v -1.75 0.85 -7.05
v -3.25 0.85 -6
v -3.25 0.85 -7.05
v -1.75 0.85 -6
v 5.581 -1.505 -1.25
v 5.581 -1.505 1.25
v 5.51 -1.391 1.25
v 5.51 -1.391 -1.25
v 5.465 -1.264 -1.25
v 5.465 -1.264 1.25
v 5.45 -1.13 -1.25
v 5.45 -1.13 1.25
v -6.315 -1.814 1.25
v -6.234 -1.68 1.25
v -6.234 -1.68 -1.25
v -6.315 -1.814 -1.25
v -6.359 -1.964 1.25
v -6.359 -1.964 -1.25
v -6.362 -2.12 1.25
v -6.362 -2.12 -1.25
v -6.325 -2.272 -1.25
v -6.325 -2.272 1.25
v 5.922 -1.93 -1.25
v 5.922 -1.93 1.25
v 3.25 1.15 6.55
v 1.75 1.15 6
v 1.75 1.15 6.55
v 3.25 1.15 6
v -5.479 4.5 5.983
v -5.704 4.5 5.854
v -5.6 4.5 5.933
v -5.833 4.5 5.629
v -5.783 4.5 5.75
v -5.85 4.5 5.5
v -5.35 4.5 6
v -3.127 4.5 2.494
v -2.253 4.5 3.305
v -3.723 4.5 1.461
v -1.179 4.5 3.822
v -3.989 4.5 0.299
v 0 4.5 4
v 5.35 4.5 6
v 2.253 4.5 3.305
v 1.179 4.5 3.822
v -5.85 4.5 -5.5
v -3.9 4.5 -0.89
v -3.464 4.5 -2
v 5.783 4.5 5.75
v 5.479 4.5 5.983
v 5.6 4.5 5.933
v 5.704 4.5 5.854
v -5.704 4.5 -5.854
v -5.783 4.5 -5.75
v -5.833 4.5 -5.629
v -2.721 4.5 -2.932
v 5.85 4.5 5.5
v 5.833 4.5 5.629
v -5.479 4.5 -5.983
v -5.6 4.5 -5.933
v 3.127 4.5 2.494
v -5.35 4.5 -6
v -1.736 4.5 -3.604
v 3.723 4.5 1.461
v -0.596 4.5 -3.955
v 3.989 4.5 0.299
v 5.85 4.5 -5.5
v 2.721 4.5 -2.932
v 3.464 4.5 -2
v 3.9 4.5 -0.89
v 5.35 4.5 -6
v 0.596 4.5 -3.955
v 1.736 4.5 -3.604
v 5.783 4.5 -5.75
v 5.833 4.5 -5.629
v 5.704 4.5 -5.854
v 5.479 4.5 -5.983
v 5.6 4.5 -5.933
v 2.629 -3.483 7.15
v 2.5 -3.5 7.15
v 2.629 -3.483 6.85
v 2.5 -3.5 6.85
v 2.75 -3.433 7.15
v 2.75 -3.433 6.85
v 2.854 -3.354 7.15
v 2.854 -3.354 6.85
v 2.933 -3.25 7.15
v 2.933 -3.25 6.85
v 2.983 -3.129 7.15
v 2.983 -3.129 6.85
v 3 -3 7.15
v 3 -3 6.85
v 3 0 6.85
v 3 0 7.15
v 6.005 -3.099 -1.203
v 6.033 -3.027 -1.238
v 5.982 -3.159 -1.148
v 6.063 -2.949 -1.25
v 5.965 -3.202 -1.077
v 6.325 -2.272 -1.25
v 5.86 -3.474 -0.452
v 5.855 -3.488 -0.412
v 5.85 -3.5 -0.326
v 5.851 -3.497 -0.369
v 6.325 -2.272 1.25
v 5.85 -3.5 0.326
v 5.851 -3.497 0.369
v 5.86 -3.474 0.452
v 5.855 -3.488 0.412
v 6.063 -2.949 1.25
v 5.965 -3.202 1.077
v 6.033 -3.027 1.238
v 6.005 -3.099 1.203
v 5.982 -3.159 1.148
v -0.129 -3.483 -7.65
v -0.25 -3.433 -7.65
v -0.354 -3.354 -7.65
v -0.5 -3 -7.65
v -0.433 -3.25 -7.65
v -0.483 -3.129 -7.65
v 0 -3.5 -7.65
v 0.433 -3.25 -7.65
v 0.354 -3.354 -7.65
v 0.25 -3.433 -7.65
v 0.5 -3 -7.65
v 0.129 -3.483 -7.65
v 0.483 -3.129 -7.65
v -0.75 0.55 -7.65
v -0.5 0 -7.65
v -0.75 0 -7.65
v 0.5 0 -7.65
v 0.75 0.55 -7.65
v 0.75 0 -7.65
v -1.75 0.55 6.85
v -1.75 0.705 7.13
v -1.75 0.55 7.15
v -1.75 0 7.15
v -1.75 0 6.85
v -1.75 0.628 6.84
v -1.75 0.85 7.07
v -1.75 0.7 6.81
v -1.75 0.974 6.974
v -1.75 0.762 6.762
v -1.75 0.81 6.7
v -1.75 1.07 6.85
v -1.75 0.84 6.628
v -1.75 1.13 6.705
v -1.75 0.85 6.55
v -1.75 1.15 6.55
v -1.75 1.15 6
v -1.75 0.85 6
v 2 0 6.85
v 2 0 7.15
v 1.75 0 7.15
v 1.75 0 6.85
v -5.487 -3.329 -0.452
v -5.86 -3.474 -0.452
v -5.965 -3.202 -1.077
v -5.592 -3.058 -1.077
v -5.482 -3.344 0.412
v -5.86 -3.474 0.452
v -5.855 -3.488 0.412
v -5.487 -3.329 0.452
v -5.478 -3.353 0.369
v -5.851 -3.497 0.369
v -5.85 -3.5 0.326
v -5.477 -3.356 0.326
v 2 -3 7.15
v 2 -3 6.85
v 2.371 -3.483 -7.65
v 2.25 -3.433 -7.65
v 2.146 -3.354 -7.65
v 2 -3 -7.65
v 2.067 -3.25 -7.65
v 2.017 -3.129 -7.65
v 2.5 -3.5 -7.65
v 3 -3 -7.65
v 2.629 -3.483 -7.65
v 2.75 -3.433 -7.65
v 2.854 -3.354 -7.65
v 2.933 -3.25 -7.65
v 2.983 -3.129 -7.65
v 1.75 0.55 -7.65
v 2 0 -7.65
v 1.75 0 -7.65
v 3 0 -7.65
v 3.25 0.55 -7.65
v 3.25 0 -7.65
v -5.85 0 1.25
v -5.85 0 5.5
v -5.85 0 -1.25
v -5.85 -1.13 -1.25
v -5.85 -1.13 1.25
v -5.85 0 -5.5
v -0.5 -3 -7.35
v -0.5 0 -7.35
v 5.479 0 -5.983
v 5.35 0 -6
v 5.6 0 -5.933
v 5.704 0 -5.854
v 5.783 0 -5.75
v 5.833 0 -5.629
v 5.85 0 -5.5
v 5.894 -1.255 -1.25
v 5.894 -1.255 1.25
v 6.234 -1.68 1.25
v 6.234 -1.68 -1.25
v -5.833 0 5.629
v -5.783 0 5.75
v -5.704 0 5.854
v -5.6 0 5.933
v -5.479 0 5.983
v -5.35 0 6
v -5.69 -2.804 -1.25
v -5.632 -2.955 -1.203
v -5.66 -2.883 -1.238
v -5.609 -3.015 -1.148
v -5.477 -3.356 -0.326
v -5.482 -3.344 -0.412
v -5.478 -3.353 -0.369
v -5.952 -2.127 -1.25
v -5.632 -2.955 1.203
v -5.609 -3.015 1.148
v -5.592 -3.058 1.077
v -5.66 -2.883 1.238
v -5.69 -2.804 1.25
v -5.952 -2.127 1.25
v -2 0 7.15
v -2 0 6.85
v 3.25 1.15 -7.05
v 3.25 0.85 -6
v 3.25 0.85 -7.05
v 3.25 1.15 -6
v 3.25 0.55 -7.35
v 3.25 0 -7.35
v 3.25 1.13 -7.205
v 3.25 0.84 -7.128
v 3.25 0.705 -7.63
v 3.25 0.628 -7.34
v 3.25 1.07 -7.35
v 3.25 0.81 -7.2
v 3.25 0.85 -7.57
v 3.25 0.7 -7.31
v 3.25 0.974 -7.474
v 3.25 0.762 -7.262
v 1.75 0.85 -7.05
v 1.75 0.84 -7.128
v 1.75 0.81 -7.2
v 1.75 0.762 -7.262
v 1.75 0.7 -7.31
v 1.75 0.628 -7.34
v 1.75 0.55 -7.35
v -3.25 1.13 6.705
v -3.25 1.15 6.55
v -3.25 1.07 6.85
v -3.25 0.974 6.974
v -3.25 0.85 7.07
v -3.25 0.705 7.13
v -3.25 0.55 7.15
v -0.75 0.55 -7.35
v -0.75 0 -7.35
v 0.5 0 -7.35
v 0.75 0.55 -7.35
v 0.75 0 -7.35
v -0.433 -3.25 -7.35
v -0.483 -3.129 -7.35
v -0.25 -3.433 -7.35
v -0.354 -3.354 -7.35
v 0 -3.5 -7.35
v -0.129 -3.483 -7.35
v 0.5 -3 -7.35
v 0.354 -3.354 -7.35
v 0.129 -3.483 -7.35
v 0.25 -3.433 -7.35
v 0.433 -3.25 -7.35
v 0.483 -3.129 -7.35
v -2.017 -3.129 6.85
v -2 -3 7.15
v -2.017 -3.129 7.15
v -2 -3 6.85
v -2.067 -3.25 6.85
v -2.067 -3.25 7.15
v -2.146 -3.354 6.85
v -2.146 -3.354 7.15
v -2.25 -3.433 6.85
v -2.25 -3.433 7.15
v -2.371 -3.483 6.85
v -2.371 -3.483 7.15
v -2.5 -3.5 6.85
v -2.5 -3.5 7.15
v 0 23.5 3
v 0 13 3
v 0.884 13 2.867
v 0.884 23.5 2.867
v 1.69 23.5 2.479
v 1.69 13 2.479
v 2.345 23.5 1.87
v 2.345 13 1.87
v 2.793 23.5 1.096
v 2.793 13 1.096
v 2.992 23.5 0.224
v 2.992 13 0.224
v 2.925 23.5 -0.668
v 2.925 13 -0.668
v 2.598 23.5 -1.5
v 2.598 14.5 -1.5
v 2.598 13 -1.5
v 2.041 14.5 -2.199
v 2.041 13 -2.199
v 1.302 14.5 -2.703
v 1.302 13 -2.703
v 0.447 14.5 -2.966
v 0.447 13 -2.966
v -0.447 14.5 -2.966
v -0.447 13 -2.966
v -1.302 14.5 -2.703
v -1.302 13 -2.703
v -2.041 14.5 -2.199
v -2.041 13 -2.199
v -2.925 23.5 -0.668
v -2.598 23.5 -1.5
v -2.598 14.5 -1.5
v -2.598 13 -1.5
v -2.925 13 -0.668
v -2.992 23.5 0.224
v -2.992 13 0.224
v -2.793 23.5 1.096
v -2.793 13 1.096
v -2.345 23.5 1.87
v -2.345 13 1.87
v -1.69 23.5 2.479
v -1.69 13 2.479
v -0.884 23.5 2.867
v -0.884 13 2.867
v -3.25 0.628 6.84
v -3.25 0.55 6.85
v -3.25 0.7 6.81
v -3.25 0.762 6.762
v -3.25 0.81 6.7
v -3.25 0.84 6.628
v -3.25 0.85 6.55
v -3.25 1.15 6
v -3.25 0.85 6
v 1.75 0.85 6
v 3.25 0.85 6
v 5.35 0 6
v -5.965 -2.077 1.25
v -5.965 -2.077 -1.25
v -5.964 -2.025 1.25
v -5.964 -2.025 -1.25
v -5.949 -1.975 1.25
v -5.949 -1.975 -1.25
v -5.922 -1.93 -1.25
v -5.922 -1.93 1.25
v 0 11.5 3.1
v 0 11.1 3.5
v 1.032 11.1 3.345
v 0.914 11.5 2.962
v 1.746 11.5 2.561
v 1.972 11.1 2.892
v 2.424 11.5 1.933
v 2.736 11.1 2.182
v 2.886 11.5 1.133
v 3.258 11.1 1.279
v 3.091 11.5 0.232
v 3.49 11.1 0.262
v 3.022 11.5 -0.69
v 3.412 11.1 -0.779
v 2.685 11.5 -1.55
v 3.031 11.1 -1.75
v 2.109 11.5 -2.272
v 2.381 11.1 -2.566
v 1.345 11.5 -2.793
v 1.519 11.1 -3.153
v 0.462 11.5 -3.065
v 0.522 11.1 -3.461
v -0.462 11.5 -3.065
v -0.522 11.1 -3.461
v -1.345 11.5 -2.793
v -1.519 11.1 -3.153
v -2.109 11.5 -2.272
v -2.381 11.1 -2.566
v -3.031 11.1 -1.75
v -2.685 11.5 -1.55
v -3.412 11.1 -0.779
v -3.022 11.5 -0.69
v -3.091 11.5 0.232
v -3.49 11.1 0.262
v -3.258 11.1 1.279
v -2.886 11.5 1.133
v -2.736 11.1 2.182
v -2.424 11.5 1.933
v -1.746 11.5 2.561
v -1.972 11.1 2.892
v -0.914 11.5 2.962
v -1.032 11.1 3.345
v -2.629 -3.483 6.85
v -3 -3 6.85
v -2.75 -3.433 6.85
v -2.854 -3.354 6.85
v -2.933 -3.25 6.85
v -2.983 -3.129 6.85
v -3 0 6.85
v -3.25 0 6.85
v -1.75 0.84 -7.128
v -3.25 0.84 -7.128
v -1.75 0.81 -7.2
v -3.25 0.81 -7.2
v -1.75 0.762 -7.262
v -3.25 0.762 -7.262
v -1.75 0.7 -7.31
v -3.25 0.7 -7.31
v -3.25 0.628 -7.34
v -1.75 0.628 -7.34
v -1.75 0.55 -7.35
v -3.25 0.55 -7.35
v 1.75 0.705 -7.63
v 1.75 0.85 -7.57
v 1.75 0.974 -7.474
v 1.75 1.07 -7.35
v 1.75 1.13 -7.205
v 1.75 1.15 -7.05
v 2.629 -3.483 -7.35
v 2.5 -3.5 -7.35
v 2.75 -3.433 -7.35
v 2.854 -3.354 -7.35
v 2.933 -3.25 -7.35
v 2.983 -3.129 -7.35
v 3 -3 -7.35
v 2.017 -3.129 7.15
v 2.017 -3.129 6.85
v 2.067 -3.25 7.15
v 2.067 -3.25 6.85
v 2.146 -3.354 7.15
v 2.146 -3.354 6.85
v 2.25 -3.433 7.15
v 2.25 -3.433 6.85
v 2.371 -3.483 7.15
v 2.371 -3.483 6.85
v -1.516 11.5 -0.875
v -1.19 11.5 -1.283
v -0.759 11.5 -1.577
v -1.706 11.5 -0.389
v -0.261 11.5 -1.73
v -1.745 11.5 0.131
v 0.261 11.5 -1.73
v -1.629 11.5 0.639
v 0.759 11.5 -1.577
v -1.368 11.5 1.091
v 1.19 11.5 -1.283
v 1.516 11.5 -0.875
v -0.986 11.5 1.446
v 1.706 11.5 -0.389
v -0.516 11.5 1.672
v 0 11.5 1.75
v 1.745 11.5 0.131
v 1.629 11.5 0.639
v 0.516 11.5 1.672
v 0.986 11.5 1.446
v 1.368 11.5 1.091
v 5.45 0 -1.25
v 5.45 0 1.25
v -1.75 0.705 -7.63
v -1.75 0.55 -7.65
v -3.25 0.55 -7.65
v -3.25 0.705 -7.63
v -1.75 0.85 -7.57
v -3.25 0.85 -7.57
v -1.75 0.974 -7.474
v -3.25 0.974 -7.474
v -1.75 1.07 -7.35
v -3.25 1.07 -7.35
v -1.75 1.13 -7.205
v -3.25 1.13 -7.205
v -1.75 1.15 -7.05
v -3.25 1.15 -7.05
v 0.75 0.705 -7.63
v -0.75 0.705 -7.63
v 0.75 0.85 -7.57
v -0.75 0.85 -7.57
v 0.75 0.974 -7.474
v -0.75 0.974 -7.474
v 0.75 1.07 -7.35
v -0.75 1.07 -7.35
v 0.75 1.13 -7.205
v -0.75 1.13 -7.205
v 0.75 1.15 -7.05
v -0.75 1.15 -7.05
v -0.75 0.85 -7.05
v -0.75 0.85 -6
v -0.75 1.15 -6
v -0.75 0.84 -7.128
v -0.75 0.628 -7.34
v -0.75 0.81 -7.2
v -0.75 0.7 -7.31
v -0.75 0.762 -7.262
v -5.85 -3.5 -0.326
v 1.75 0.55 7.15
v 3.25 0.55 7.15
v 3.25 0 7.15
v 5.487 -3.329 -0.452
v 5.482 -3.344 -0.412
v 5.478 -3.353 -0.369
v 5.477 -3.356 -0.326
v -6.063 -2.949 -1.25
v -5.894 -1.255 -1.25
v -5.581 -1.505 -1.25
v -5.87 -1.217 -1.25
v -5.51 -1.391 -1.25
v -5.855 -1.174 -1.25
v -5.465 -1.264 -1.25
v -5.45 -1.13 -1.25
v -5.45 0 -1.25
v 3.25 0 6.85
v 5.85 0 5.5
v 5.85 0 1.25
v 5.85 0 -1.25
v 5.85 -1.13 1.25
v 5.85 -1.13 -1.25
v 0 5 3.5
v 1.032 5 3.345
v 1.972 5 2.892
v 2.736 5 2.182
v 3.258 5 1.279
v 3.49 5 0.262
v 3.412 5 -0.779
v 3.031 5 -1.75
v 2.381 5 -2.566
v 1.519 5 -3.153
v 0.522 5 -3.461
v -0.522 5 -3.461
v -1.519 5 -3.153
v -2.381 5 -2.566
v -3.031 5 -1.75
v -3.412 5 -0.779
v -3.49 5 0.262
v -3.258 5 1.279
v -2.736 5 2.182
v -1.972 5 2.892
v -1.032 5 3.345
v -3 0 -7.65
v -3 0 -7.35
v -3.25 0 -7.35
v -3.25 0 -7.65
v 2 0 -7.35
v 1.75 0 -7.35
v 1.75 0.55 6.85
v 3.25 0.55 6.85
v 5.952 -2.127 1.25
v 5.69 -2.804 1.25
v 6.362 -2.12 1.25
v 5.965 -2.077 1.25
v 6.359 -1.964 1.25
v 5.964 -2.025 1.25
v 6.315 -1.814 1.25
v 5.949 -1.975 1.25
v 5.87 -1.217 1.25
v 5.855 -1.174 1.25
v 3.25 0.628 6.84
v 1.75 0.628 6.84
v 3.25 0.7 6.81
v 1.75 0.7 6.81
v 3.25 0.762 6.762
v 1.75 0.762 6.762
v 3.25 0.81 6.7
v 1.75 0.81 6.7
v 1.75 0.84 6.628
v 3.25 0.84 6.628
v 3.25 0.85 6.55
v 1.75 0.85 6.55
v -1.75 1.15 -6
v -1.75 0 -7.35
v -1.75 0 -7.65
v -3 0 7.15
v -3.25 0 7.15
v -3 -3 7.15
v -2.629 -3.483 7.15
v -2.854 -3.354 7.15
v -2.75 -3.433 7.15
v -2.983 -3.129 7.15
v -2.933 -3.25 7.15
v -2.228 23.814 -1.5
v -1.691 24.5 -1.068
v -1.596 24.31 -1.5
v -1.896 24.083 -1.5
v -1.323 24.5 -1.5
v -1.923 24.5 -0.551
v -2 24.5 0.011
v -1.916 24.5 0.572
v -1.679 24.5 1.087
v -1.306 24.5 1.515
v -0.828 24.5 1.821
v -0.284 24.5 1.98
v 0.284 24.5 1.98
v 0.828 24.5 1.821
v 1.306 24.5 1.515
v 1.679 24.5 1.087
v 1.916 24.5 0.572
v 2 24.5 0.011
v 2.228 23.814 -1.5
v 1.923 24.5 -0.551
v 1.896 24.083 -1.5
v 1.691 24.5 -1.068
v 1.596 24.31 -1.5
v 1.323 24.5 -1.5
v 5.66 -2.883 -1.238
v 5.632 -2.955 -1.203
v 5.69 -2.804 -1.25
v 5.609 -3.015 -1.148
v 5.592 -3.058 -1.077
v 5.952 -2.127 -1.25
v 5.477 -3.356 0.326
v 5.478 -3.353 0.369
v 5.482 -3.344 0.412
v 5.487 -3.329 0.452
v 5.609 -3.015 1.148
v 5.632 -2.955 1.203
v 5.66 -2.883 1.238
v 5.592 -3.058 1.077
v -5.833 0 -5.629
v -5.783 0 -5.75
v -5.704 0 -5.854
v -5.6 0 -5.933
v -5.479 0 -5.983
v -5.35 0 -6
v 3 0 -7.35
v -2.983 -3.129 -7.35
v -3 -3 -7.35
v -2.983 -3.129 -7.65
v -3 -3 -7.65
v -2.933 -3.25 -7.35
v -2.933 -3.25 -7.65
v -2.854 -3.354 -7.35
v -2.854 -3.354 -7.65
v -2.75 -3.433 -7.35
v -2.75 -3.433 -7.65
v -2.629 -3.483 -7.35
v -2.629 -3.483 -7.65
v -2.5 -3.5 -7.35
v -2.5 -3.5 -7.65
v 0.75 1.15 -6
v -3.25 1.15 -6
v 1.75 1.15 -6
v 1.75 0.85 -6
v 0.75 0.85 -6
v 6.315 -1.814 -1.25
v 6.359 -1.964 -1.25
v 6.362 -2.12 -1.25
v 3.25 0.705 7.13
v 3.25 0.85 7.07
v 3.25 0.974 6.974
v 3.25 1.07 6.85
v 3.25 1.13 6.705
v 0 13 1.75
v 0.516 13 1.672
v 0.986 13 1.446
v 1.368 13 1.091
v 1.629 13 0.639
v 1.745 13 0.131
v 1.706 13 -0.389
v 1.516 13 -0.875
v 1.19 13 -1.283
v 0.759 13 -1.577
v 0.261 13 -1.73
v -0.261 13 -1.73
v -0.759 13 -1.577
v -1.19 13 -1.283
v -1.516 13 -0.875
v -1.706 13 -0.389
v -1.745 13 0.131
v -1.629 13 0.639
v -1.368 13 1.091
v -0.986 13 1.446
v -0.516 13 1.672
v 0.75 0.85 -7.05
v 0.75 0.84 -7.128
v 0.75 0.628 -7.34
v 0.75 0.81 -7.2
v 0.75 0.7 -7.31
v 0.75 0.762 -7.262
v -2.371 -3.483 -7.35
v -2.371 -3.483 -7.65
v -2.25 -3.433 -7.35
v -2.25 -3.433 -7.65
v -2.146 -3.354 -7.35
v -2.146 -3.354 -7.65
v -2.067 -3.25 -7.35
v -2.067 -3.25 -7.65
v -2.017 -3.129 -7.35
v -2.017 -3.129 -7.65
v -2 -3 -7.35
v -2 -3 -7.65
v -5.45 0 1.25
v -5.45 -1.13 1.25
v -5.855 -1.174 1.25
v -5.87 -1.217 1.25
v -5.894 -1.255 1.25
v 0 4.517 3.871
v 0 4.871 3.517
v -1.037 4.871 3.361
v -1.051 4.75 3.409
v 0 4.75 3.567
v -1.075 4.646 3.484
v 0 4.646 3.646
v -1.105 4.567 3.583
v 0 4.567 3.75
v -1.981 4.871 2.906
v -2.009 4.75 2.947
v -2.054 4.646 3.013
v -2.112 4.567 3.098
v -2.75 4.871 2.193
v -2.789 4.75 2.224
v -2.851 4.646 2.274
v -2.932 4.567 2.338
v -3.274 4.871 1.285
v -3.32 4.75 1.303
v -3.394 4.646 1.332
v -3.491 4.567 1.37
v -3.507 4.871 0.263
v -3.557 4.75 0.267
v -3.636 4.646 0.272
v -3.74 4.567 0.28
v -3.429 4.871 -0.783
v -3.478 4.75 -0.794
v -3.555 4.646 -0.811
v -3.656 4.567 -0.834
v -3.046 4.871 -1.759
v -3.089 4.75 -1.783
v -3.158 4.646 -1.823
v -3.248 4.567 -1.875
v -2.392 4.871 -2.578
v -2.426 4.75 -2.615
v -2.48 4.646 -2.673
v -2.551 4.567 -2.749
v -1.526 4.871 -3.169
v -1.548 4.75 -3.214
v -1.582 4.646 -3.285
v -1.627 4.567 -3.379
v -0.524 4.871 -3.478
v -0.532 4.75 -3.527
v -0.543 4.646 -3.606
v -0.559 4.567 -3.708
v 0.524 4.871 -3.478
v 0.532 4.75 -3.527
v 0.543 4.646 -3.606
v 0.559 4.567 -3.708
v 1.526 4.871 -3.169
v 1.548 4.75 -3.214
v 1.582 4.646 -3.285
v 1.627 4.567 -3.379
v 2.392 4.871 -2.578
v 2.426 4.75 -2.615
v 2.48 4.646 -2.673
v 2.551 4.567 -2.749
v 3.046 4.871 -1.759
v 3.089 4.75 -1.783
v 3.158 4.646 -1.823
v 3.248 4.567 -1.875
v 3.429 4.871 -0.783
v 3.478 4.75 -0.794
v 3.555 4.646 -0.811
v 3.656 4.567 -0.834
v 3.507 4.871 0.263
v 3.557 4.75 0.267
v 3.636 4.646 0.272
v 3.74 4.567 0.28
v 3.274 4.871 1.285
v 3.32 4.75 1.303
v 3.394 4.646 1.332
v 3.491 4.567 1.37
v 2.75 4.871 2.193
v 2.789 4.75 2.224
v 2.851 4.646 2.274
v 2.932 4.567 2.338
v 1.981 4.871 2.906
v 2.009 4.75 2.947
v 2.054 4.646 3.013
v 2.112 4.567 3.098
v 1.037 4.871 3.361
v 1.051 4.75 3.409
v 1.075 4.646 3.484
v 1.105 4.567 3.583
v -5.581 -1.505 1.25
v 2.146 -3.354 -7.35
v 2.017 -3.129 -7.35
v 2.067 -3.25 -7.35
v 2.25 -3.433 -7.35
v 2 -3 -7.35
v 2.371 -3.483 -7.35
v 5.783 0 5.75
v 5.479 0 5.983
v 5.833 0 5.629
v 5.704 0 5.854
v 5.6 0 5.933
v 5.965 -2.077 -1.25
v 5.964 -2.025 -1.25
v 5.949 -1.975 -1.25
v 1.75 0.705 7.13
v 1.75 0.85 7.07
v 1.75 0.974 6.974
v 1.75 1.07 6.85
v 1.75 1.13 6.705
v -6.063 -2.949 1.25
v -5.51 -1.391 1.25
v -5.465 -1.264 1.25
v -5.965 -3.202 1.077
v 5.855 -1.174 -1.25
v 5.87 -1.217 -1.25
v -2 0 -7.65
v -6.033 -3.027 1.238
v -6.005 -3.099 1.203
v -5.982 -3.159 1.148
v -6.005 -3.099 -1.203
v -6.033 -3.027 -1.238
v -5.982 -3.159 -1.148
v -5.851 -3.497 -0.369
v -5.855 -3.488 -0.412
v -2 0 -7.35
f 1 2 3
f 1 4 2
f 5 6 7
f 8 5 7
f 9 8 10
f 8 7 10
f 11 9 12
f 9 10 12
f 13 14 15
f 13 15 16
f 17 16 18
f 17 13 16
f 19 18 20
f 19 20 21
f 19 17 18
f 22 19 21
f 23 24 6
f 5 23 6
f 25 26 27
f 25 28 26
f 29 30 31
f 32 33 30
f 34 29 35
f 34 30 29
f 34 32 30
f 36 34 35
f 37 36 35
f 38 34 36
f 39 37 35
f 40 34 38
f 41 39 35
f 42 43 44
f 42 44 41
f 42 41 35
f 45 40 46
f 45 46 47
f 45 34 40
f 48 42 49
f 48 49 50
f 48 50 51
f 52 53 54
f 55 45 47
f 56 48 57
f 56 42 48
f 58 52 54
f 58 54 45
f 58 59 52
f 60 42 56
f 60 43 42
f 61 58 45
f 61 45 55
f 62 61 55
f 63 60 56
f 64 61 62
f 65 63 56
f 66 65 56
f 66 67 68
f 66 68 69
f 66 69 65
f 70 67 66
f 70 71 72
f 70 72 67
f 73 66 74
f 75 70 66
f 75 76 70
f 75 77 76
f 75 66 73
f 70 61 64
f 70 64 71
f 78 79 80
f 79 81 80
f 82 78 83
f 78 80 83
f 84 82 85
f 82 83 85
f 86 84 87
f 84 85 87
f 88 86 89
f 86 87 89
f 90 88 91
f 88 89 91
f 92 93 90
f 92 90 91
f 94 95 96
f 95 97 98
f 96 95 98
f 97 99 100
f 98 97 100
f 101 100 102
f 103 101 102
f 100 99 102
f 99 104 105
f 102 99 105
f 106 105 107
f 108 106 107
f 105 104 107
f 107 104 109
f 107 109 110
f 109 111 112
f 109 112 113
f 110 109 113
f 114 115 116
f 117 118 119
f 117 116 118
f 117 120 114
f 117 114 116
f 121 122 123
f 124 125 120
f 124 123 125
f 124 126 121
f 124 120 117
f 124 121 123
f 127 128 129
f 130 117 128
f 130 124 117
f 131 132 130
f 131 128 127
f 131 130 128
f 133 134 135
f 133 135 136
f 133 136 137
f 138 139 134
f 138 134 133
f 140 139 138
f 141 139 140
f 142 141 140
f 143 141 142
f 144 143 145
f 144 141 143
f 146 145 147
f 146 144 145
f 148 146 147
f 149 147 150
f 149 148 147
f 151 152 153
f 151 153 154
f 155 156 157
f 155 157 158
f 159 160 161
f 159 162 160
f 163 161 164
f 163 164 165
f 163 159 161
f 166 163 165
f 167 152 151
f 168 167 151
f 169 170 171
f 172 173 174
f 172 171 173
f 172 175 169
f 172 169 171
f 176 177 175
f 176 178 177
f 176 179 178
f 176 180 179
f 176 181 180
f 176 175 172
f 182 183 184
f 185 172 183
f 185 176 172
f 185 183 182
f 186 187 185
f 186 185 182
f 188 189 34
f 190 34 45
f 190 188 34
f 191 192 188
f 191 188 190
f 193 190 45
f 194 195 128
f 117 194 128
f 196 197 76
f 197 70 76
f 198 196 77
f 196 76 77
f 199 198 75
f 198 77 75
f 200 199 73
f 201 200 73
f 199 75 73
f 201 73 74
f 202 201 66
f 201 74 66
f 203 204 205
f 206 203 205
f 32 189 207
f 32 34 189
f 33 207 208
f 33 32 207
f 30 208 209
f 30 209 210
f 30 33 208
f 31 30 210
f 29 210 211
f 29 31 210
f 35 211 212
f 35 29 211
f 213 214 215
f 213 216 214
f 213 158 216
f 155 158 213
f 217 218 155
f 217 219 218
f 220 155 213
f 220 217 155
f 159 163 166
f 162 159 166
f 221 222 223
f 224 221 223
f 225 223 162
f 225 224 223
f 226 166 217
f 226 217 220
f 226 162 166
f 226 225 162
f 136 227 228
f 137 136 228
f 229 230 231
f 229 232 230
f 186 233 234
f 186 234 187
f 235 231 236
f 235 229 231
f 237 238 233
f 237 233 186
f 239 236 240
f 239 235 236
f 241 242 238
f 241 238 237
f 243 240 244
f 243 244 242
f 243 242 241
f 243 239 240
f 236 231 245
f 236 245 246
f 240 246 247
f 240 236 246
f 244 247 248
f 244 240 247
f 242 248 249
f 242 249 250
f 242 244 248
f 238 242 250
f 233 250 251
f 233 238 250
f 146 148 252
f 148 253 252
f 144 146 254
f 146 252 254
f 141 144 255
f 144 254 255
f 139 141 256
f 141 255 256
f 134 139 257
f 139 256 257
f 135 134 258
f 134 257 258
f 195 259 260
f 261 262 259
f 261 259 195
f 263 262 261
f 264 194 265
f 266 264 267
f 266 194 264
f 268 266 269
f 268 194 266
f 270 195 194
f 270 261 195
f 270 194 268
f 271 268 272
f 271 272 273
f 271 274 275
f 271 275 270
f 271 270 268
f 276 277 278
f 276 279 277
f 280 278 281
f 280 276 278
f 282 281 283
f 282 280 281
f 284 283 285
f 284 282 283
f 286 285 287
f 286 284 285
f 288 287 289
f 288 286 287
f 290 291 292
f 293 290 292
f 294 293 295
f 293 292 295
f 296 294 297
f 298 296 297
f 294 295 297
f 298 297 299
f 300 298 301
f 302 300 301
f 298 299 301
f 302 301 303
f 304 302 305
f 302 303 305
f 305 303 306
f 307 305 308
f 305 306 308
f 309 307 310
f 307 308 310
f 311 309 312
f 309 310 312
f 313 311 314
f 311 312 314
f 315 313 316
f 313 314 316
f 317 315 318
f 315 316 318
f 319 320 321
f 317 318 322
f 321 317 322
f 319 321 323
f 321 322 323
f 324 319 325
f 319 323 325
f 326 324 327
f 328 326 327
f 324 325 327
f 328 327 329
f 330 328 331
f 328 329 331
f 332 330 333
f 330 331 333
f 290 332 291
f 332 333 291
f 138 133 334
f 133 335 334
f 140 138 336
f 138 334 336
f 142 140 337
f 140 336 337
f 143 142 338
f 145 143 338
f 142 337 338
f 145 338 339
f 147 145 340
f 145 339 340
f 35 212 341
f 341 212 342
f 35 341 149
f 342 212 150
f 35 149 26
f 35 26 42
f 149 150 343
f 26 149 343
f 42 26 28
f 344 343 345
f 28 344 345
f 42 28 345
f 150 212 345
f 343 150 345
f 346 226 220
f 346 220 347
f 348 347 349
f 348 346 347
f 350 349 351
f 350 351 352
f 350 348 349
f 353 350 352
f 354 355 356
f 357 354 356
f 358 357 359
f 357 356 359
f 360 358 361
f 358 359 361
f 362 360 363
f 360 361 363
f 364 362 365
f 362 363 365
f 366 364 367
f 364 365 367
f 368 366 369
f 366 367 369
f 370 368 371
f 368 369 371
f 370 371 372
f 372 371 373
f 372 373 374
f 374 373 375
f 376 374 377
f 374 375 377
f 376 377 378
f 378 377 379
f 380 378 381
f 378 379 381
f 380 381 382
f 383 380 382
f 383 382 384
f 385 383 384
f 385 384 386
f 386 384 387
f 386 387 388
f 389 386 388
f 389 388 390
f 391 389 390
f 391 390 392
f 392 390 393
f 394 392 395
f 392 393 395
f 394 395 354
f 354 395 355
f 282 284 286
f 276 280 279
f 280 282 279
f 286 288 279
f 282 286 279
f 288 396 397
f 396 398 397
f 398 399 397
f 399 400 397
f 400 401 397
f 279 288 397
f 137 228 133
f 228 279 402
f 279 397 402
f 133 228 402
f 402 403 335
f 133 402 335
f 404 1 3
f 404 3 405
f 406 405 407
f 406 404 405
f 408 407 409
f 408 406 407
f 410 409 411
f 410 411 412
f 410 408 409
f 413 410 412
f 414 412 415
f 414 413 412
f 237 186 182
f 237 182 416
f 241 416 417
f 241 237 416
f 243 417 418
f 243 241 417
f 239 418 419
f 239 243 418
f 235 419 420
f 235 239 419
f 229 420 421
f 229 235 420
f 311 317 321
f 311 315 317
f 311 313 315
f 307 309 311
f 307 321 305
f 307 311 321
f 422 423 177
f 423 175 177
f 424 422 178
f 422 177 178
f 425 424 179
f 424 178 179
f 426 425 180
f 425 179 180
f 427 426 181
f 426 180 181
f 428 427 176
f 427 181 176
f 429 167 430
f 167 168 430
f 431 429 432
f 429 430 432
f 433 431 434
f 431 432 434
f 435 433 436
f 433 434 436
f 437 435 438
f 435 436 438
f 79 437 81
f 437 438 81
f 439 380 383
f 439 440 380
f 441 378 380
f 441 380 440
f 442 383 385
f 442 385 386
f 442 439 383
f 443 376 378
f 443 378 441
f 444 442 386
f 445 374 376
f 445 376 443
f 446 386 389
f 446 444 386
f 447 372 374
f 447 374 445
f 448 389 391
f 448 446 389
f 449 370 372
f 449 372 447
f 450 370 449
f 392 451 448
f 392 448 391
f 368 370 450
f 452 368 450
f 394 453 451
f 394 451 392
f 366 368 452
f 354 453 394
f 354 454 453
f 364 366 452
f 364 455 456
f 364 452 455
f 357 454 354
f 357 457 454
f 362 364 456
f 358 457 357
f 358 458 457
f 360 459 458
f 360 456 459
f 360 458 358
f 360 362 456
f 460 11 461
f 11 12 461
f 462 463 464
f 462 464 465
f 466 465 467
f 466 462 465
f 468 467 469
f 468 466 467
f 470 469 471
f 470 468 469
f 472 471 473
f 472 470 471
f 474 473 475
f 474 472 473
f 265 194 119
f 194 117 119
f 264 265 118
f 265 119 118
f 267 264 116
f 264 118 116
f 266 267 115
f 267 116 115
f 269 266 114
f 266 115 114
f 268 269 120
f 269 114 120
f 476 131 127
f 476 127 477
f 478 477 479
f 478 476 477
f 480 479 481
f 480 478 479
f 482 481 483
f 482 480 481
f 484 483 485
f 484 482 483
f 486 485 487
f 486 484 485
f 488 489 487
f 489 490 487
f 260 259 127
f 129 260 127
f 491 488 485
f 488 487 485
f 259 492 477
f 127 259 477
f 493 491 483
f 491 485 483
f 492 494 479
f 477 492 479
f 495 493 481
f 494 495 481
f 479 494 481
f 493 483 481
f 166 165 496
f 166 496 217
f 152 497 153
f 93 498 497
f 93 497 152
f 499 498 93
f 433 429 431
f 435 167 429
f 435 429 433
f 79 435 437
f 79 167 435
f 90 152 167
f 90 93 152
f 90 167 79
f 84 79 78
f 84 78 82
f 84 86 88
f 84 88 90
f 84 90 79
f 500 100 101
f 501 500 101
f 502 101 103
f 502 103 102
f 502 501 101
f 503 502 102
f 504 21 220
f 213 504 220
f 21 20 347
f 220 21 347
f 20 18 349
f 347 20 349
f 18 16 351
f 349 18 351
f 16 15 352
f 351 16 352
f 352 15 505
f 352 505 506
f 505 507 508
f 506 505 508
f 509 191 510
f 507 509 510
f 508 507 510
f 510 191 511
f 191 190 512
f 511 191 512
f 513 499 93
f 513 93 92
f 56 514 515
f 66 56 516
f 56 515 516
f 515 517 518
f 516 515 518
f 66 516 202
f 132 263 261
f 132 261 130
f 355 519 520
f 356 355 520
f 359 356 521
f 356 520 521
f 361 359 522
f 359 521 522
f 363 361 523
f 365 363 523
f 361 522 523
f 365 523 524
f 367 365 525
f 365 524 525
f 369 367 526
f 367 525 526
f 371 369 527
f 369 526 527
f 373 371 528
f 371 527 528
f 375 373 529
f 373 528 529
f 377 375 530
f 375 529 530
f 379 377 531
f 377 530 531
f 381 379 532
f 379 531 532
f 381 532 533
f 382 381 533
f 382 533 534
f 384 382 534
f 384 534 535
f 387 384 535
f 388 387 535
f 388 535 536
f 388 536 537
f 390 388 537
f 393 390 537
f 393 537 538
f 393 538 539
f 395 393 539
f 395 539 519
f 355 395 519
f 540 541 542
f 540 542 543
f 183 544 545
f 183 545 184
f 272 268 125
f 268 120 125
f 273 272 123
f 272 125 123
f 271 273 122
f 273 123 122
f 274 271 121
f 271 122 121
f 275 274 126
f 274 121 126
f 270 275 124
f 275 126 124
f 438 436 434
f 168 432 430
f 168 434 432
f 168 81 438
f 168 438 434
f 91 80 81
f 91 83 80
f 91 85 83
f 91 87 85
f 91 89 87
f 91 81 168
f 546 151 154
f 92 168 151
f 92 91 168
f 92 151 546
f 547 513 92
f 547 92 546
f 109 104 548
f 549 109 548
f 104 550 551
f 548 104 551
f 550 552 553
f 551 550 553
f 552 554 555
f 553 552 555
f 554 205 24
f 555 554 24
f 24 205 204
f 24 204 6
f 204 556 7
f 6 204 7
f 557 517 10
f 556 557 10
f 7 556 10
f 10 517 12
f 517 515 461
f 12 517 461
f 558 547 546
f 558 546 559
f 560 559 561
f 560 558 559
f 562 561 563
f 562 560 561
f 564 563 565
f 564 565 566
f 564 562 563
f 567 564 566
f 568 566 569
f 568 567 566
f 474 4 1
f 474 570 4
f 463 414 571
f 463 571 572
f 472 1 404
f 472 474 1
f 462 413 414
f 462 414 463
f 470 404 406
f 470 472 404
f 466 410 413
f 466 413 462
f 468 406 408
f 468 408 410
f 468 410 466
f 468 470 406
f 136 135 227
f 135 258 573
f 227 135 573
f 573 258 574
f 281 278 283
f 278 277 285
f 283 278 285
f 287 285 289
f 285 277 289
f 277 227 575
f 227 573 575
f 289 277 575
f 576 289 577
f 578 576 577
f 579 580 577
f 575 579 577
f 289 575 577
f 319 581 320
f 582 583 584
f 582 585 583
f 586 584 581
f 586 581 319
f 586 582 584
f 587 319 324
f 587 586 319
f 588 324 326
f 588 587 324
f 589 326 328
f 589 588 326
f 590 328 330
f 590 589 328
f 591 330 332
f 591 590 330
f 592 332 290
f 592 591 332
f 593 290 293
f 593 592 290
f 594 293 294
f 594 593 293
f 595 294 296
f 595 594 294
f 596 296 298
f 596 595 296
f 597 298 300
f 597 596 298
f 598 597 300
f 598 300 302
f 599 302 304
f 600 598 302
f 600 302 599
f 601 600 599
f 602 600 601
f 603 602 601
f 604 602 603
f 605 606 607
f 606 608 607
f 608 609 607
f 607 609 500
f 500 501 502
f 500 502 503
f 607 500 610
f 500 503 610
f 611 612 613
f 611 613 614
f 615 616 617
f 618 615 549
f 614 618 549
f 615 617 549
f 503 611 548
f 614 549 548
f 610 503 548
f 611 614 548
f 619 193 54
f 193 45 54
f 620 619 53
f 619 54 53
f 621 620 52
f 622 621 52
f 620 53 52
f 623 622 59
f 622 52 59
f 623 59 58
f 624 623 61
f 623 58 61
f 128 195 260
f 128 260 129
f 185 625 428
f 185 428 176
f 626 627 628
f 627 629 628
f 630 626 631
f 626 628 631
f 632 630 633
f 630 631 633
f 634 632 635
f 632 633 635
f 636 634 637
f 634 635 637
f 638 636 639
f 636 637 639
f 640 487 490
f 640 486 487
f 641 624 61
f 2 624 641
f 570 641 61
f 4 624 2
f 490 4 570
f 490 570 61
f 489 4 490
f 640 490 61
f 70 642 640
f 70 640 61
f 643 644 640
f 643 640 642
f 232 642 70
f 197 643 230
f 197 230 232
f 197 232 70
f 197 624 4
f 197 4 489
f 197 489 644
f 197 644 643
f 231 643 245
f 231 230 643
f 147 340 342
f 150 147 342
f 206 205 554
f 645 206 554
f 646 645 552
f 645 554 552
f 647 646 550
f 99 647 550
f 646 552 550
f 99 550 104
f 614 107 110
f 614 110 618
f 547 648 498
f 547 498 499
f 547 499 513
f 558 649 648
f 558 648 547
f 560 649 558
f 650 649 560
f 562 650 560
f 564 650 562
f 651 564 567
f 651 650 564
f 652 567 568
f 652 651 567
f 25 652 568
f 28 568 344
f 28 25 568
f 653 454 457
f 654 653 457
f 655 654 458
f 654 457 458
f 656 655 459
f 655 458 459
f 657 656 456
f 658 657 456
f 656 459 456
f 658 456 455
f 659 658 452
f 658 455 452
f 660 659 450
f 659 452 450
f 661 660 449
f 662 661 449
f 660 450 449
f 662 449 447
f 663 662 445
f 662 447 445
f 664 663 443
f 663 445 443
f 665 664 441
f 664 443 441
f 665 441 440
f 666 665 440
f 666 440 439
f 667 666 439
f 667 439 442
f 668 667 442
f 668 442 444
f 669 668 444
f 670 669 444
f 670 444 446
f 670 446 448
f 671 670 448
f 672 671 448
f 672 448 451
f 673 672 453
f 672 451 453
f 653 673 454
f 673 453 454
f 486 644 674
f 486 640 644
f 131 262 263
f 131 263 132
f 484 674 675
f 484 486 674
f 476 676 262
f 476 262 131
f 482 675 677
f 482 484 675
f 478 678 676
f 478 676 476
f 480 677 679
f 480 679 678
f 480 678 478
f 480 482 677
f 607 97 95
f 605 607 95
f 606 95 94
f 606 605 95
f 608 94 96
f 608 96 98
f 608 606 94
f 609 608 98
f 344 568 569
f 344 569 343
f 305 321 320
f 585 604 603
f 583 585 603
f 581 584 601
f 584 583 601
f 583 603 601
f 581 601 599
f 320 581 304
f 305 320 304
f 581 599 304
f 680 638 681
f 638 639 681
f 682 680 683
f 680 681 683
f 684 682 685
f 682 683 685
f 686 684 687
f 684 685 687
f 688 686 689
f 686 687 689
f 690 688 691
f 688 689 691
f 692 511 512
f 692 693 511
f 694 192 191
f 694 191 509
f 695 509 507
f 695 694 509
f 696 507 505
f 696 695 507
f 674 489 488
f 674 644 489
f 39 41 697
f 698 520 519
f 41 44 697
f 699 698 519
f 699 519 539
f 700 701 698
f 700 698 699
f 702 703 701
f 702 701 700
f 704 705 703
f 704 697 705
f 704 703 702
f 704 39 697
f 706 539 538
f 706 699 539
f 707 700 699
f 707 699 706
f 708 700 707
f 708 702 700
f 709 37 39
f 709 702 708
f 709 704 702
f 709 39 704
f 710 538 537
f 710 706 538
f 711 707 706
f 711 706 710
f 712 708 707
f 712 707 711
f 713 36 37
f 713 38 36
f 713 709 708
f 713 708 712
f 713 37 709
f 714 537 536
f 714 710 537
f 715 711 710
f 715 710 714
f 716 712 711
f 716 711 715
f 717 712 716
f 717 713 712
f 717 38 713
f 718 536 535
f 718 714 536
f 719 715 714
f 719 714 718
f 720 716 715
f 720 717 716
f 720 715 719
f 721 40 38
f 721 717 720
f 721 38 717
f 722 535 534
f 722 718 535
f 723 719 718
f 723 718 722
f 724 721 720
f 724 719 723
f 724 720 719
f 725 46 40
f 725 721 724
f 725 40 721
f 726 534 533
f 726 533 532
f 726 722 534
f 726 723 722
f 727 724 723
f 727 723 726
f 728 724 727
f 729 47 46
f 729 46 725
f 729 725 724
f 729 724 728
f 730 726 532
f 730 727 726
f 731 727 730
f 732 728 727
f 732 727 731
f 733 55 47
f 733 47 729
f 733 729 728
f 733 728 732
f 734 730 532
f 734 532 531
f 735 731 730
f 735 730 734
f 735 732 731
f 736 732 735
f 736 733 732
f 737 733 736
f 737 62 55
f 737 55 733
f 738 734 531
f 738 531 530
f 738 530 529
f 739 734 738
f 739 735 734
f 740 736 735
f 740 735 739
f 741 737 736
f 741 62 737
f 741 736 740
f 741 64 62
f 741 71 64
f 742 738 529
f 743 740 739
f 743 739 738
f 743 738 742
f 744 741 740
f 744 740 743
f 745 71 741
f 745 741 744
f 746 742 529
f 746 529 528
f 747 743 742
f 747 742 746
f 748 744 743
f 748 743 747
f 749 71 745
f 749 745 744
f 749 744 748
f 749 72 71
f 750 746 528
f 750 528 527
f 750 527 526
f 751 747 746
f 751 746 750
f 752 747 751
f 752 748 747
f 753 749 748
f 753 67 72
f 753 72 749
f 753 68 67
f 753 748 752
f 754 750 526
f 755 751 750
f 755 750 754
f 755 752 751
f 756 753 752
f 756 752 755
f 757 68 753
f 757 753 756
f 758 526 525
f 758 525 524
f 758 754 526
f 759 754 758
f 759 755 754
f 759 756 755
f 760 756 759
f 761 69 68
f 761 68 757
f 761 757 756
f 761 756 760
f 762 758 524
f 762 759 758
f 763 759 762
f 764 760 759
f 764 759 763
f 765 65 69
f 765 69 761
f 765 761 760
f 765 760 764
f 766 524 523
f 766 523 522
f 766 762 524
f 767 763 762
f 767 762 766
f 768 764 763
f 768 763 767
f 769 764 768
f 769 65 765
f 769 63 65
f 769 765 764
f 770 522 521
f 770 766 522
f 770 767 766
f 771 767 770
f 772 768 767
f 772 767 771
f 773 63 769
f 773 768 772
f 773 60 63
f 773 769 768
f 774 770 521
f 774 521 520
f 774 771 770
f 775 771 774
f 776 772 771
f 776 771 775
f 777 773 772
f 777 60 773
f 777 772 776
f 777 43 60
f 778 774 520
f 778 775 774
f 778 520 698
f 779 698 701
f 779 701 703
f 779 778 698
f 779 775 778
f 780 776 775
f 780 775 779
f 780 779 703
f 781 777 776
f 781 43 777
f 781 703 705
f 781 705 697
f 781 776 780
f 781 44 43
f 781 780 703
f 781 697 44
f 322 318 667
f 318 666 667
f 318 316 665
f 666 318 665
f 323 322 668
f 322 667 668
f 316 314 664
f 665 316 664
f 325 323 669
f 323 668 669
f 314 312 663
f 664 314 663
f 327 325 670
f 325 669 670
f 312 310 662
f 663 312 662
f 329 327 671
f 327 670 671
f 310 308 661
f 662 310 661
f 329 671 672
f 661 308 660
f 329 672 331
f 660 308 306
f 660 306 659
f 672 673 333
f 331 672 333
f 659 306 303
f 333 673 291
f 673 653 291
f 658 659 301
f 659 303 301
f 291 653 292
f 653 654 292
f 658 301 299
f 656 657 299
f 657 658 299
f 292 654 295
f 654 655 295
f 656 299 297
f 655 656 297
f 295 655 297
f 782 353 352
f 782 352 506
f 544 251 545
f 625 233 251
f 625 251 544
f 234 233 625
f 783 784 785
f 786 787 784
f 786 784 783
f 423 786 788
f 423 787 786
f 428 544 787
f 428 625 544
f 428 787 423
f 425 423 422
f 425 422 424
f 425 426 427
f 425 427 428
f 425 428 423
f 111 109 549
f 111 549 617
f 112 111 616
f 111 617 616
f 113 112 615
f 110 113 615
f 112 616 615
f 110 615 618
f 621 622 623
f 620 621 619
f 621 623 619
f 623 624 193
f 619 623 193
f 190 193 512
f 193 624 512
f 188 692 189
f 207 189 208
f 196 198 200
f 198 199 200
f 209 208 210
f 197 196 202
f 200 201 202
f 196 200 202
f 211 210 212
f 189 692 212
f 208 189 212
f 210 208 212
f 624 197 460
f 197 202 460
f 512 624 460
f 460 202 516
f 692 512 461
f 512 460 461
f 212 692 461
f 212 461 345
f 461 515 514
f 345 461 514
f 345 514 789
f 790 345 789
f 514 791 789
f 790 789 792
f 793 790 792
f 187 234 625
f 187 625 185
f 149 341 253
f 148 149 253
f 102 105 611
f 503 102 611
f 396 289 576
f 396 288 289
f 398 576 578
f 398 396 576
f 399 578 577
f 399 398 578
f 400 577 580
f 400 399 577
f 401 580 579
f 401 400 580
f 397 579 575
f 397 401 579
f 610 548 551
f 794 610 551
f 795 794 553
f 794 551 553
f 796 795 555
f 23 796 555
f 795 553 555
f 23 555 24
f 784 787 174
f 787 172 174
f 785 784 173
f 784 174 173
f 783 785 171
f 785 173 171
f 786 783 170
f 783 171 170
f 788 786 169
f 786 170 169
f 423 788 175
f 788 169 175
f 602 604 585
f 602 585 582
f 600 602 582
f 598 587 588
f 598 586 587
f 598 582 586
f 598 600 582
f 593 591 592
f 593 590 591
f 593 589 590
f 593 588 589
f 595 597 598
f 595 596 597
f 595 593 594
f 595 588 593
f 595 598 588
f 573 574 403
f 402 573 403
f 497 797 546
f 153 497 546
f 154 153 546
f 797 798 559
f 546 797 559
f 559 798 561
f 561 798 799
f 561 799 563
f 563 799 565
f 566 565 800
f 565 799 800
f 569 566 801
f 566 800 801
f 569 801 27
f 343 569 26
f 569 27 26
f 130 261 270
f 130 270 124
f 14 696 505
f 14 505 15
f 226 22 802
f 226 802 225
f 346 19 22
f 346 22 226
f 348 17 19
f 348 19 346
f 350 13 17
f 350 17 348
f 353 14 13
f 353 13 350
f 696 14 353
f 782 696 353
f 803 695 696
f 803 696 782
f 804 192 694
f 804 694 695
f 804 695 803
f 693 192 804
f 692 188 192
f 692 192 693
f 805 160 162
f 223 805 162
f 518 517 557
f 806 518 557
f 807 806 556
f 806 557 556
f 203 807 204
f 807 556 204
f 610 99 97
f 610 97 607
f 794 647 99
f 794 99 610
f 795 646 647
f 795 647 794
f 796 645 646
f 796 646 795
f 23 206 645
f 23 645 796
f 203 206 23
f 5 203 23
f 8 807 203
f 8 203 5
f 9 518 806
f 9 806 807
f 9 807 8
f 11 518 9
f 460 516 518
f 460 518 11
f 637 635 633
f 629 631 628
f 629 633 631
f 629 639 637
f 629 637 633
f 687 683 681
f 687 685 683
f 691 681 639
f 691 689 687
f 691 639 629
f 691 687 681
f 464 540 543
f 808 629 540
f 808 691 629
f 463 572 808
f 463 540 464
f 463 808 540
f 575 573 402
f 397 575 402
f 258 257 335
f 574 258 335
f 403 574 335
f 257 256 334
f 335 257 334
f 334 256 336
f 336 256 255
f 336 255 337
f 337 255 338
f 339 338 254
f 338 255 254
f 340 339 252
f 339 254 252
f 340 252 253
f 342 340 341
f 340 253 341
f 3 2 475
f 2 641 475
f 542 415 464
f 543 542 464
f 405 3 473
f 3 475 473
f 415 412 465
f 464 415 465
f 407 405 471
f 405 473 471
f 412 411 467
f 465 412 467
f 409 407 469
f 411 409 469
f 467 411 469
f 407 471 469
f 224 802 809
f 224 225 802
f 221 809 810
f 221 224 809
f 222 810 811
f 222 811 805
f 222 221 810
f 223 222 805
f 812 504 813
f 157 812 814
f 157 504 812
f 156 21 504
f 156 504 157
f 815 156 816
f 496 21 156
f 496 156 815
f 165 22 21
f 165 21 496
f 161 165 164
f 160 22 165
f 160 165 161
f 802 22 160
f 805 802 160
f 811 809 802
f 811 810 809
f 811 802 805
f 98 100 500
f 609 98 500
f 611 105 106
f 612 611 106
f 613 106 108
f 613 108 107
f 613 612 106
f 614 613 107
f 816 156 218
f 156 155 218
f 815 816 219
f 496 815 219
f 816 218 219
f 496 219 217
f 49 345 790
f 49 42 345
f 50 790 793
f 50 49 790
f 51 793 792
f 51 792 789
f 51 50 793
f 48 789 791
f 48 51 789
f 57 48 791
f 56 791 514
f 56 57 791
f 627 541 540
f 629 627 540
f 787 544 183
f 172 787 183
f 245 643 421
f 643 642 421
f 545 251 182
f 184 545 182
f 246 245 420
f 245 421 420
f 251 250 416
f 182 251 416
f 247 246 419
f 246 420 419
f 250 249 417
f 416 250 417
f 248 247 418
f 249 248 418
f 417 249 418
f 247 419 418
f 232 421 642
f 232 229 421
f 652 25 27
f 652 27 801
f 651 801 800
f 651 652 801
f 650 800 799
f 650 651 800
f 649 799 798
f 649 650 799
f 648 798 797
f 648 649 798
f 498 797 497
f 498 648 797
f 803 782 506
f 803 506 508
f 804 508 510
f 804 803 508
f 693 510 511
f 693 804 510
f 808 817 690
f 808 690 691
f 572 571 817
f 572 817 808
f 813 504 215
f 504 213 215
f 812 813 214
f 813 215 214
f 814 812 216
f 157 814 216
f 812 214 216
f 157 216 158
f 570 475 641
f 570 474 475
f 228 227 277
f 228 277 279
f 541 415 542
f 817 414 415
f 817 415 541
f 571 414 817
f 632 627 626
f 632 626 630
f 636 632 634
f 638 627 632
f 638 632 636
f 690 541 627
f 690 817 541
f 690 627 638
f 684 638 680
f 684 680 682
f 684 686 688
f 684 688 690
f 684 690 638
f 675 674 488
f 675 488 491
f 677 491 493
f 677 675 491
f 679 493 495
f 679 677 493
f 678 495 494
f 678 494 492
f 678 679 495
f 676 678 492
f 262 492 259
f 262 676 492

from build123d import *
from OCP.BRepFilletAPI import BRepFilletAPI_MakeChamfer

# Parameters (mm, degrees)
SKETCH_1_W                         = 11.7
SKETCH_1_H                         = 12
EXTRUDE_1_DEPTH                    = 4.5
SKETCH_9_R                         = 3.5
EXTRUDE_2_DEPTH                    = 11.5
SKETCH_10_R                        = 1.75
EXTRUDE_3_DEPTH                    = 1.5
SKETCH_11_R                        = 3
EXTRUDE_4_DEPTH                    = 11.5
CHAMFER_1_SIZE                     = 1
CHAMFER_2_SIZE                     = 0.4
SKETCH_12_W                        = 6
SKETCH_12_H                        = 1.5
CUT_EXTRUDE_1_DEPTH                = 10
FILLET_1_R                         = 0.5
FILLET_2_R                         = 0.5
EXTRUDE_1_2_DEPTH                  = 1.25
CHAMFER_3_SIZE                     = 0.4
CHAMFER_3_SIZE2                    = 0.857802768
FILLET_3_R                         = 0.3
CHAMFER_3_OF_MIRROR_1_SIZE         = 0.4
CHAMFER_3_OF_MIRROR_1_SIZE2        = 0.857802768
FILLET_3_OF_MIRROR_1_R             = 0.3
EXTRUDE_2_2_DEPTH                  = 0.5
EXTRUDE_3_2_DEPTH                  = 0.75
FILLET_4_R                         = 0.5
PATTERN_LINEAR_1_COUNT             = 2
PATTERN_LINEAR_1_PITCH             = 2.5
FILLET_4_OF_PATTERN_LINEAR_1_R     = 0.5
PATTERN_LINEAR_1_COL_COUNT         = 2
PATTERN_LINEAR_1_COL_PITCH         = 2.5
FILLET_4_OF_PATTERN_LINEAR_1_COL_R = 0.5
EXTRUDE_START                      = 2.5
EXTRUDE_4_2_DEPTH                  = 0.5
EXTRUDE_5_DEPTH                    = 0.75
FILLET_5_R                         = 0.5
FILLET_5_OF_MIRROR_2_R             = 0.5


with BuildPart() as part:
    # Эскиз1 → Extrude 1 (new body)
    with BuildSketch(Plane(origin=(0, 0, 0), x_dir=(1, 0, 0), z_dir=(0, 1, 0))):
        Rectangle(SKETCH_1_W, SKETCH_1_H)
    extrude(amount=EXTRUDE_1_DEPTH)

    # Эскиз9 → Extrude 2 (add)
    with BuildSketch(Plane(origin=(0, 0, 0), x_dir=(1, 0, 0), z_dir=(0, 1, 0))):
        with Locations(Location((0, 0, 0), (0, 0, 270))):
            Circle(SKETCH_9_R)
    extrude(amount=EXTRUDE_2_DEPTH)

    # Эскиз10 → Extrude 3 (add)
    with BuildSketch(Plane(origin=(0, 11.5, 0), x_dir=(1, 0, 0), z_dir=(0, 1, 0))):
        with Locations(Location((0, 0, 0), (0, 0, 270))):
            Circle(SKETCH_10_R)
    extrude(amount=EXTRUDE_3_DEPTH)

    # Эскиз11 → Extrude 4 (add)
    with BuildSketch(Plane(origin=(0, 13, 0), x_dir=(1, 0, 0), z_dir=(0, 1, 0))):
        with Locations(Location((0, 0, 0), (0, 0, 270))):
            Circle(SKETCH_11_R)
    extrude(amount=EXTRUDE_4_DEPTH)

    # Фаска1
    chamfer_1_edges = [part.edges().sort_by_distance(p)[0] for p in [
        (0, 24.5, -3),
    ]]
    chamfer(chamfer_1_edges, length=CHAMFER_1_SIZE)

    # Фаска2
    chamfer_2_edges = [part.edges().sort_by_distance(p)[0] for p in [
        (0, 11.5, -3.5),
    ]]
    chamfer(chamfer_2_edges, length=CHAMFER_2_SIZE)

    # Эскиз12 → Вырез-Вытянуть1 (cut)
    with BuildSketch(Plane(origin=(0, 24.5, 0), x_dir=(1, 0, 0), z_dir=(0, 1, 0))):
        with Locations((0, 2.25)):
            Rectangle(SKETCH_12_W, SKETCH_12_H)
    extrude(amount=-CUT_EXTRUDE_1_DEPTH, mode=Mode.SUBTRACT)

    # Скругление1
    fillet_1_edges = [part.edges().sort_by_distance(p)[0] for p in [
        (0, 4.5, -3.5),
    ]]
    fillet(fillet_1_edges, radius=FILLET_1_R)

    # Скругление2
    fillet_2_edges = [part.edges().sort_by_distance(p)[0] for p in [
        (5.85, 2.25, 6),
        (-5.85, 2.25, 6),
        (-5.85, 2.25, -6),
        (5.85, 2.25, -6),
    ]]
    fillet(fillet_2_edges, radius=FILLET_2_R)

    # Эскиз13 → Extrude 1 2 (add, symmetric)
    with BuildSketch(Plane.XY):
        with BuildLine():
            Line((-5.85, 0), (-5.85, -1.129843788))
            ThreePointArc((-5.85, -1.129843788), (-5.861274336, -1.196045176), (-5.893826238, -1.254782798))
            Line((-5.893826238, -1.254782798), (-6.234378942, -1.680473678))
            ThreePointArc((-6.234378942, -1.680473678), (-6.358875719, -1.964024187), (-6.325398516, -2.271887168))
            Line((-6.325398516, -2.271887168), (-5.85, -3.5))
            Line((-5.85, -3.5), (-5.476972761, -3.355602359))
            Line((-5.476972761, -3.355602359), (-5.952371276, -2.127489527))
            ThreePointArc((-5.952371276, -2.127489527), (-5.963530344, -2.024868533), (-5.922031419, -1.930351697))
            Line((-5.922031419, -1.930351697), (-5.581478714, -1.504660817))
            ThreePointArc((-5.581478714, -1.504660817), (-5.483823009, -1.328447953), (-5.45, -1.129843788))
            Line((-5.45, -1.129843788), (-5.45, 0))
            Line((-5.45, 0), (-5.85, 0))
        make_face()
    extrude_1_2 = extrude(amount=EXTRUDE_1_2_DEPTH, both=True)

    # Фаска3: one chamfer whose edges measure the first distance from different faces: ONE call of the kernel's chamfer builder (chamfer() names one face for all edges)
    chamfer_3_edges_1 = [part.edges().sort_by_distance(p)[0] for p in [
        (-5.66348638, -3.427801179, 1.25),
    ]]
    chamfer_3_side_1 = [part.faces().sort_by_distance(p)[0] for p in [
        (-5.837614818, -1.735838174, 1.25),
    ]]
    chamfer_3_edges_2 = [part.edges().sort_by_distance(p)[0] for p in [
        (-5.66348638, -3.427801179, -1.25),
    ]]
    chamfer_3_side_2 = [part.faces().sort_by_distance(p)[0] for p in [
        (-5.837614818, -1.735838174, -1.25),
    ]]
    chamfer_3 = BRepFilletAPI_MakeChamfer(part.part.solid().wrapped)
    for e in chamfer_3_edges_1:
        chamfer_3.Add(CHAMFER_3_SIZE, CHAMFER_3_SIZE2, e.wrapped, chamfer_3_side_1[0].wrapped)  # the first distance lies on this face
    for e in chamfer_3_edges_2:
        chamfer_3.Add(CHAMFER_3_SIZE, CHAMFER_3_SIZE2, e.wrapped, chamfer_3_side_2[0].wrapped)  # the first distance lies on this face
    add(Compound.cast(chamfer_3.Shape()), mode=Mode.REPLACE)

    # Скругление3
    fillet_3_edges = [part.edges().sort_by_distance(p)[0] for p in [
        (-5.807884021, -3.05477394, -1.25),
        (-5.66348638, -3.427801179, 0.392197232),
        (-5.66348638, -3.427801179, -0.392197232),
        (-5.807884021, -3.05477394, 1.25),
    ]]
    fillet(fillet_3_edges, radius=FILLET_3_R)

    # Зеркальное отражение1: Extrude 1 2 across plane
    add(extrude_1_2.mirror(Plane(origin=(0, 0, 0), x_dir=(0, 0, 1), z_dir=(1, 0, 0))))

    # Фаска3 of Зеркальное отражение1: one chamfer whose edges measure the first distance from different faces: ONE call of the kernel's chamfer builder (chamfer() names one face for all edges)
    chamfer_3_of_mirror_1_edges_1 = [part.edges().sort_by_distance(p)[0] for p in [
        (5.66348638, -3.427801179, 1.25),
    ]]
    chamfer_3_of_mirror_1_side_1 = [part.faces().sort_by_distance(p)[0] for p in [
        (5.837614818, -1.735838174, 1.25),
    ]]
    chamfer_3_of_mirror_1_edges_2 = [part.edges().sort_by_distance(p)[0] for p in [
        (5.66348638, -3.427801179, -1.25),
    ]]
    chamfer_3_of_mirror_1_side_2 = [part.faces().sort_by_distance(p)[0] for p in [
        (5.837614818, -1.735838174, -1.25),
    ]]
    chamfer_3_of_mirror_1 = BRepFilletAPI_MakeChamfer(part.part.solid().wrapped)
    for e in chamfer_3_of_mirror_1_edges_1:
        chamfer_3_of_mirror_1.Add(CHAMFER_3_OF_MIRROR_1_SIZE, CHAMFER_3_OF_MIRROR_1_SIZE2, e.wrapped, chamfer_3_of_mirror_1_side_1[0].wrapped)  # the first distance lies on this face
    for e in chamfer_3_of_mirror_1_edges_2:
        chamfer_3_of_mirror_1.Add(CHAMFER_3_OF_MIRROR_1_SIZE, CHAMFER_3_OF_MIRROR_1_SIZE2, e.wrapped, chamfer_3_of_mirror_1_side_2[0].wrapped)  # the first distance lies on this face
    add(Compound.cast(chamfer_3_of_mirror_1.Shape()), mode=Mode.REPLACE)

    # Скругление3 of Зеркальное отражение1
    fillet_3_of_mirror_1_edges = [part.edges().sort_by_distance(p)[0] for p in [
        (5.807884021, -3.05477394, -1.25),
        (5.66348638, -3.427801179, 0.392197232),
        (5.66348638, -3.427801179, -0.392197232),
        (5.807884021, -3.05477394, 1.25),
    ]]
    fillet(fillet_3_of_mirror_1_edges, radius=FILLET_3_OF_MIRROR_1_R)

    # Эскиз14 → Extrude 2 2 (add, symmetric)
    with BuildSketch(Plane(origin=(0, 0, 0), x_dir=(0, 0, -1), z_dir=(1, 0, 0))):
        with BuildLine():
            Line((6, 0.85), (7.05, 0.85))
            ThreePointArc((7.05, 0.85), (7.262132034, 0.762132034), (7.35, 0.55))
            Line((7.35, 0.55), (7.35, -3.5))
            Line((7.35, -3.5), (7.65, -3.5))
            Line((7.65, -3.5), (7.65, 0.55))
            ThreePointArc((7.65, 0.55), (7.474264069, 0.974264069), (7.05, 1.15))
            Line((7.05, 1.15), (6, 1.15))
            Line((6, 1.15), (6, 0.85))
        make_face()
    extrude_2_2 = extrude(amount=EXTRUDE_2_2_DEPTH, both=True)

    # Эскиз15 → Extrude 3 2 (add, symmetric)
    with BuildSketch(Plane(origin=(0, 0, 0), x_dir=(0, 0, -1), z_dir=(1, 0, 0))):
        with BuildLine():
            Line((6, 0.85), (7.05, 0.85))
            ThreePointArc((7.05, 0.85), (7.262132034, 0.762132034), (7.35, 0.55))
            Line((7.35, 0.55), (7.35, 0))
            Line((7.35, 0), (7.65, 0))
            Line((7.65, 0), (7.65, 0.55))
            ThreePointArc((7.65, 0.55), (7.474264069, 0.974264069), (7.05, 1.15))
            Line((7.05, 1.15), (6, 1.15))
            Line((6, 1.15), (6, 0.85))
        make_face()
    extrude_3_2 = extrude(amount=EXTRUDE_3_2_DEPTH, both=True)

    # Скругление4
    fillet_4_edges = [part.edges().sort_by_distance(p)[0] for p in [
        (-0.5, -3.5, -7.5),
        (0.5, -3.5, -7.5),
    ]]
    fillet(fillet_4_edges, radius=FILLET_4_R - 0.0001)  # a hair under: the kernel refuses the full size

    # Линейный массив1: Extrude 2 2, Extrude 3 2 ×2
    with Locations(*[(i * PATTERN_LINEAR_1_PITCH, 0, 0) for i in range(1, PATTERN_LINEAR_1_COUNT)]):
        add(extrude_2_2)
        add(extrude_3_2)

    # Скругление4 of Линейный массив1
    fillet_4_of_pattern_linear_1_edges = [part.edges().sort_by_distance(p)[0] for p in [
        (2, -3.5, -7.5),
        (3, -3.5, -7.5),
    ]]
    fillet(fillet_4_of_pattern_linear_1_edges, radius=FILLET_4_OF_PATTERN_LINEAR_1_R - 0.0001)  # a hair under: the kernel refuses the full size

    # Линейный массив1 col: Extrude 2 2, Extrude 3 2 ×2
    with Locations(*[(-i * PATTERN_LINEAR_1_COL_PITCH, 0, 0) for i in range(1, PATTERN_LINEAR_1_COL_COUNT)]):
        add(extrude_2_2)
        add(extrude_3_2)

    # Скругление4 of Линейный массив1 col
    fillet_4_of_pattern_linear_1_col_edges = [part.edges().sort_by_distance(p)[0] for p in [
        (-3, -3.5, -7.5),
        (-2, -3.5, -7.5),
    ]]
    fillet(fillet_4_of_pattern_linear_1_col_edges, radius=FILLET_4_OF_PATTERN_LINEAR_1_COL_R - 0.0001)  # a hair under: the kernel refuses the full size

    # Эскиз16 → Extrude 4 2 (add, symmetric)
    with BuildSketch(Plane(origin=(0, 0, 0), x_dir=(0, 0, -1), z_dir=(1, 0, 0)).offset(EXTRUDE_START)):
        with BuildLine():
            Line((-6, 1.15), (-6.55, 1.15))
            ThreePointArc((-6.55, 1.15), (-6.974264069, 0.974264069), (-7.15, 0.55))
            Line((-7.15, 0.55), (-7.15, -3.5))
            Line((-7.15, -3.5), (-6.85, -3.5))
            Line((-6.85, -3.5), (-6.85, 0.55))
            ThreePointArc((-6.85, 0.55), (-6.762132034, 0.762132034), (-6.55, 0.85))
            Line((-6.55, 0.85), (-6, 0.85))
            Line((-6, 0.85), (-6, 1.15))
        make_face()
    extrude_4_2 = extrude(amount=EXTRUDE_4_2_DEPTH, both=True)

    # Эскиз17 → Вытянуть-Тонкостенный5 (add, symmetric)
    with BuildSketch(Plane(origin=(0, 0, 0), x_dir=(0, 0, -1), z_dir=(1, 0, 0)).offset(EXTRUDE_START)):
        with BuildLine():
            Line((-6, 1.15), (-6.55, 1.15))
            ThreePointArc((-6.55, 1.15), (-6.974264069, 0.974264069), (-7.15, 0.55))
            Line((-7.15, 0.55), (-7.15, 0))
            Line((-7.15, 0), (-6.85, 0))
            Line((-6.85, 0), (-6.85, 0.55))
            ThreePointArc((-6.85, 0.55), (-6.762132034, 0.762132034), (-6.55, 0.85))
            Line((-6.55, 0.85), (-6, 0.85))
            Line((-6, 0.85), (-6, 1.15))
        make_face()
    extrude_5 = extrude(amount=EXTRUDE_5_DEPTH, both=True)

    # Скругление5
    fillet_5_edges = [part.edges().sort_by_distance(p)[0] for p in [
        (3, -3.5, 7),
        (2, -3.5, 7),
    ]]
    fillet(fillet_5_edges, radius=FILLET_5_R - 0.0001)  # a hair under: the kernel refuses the full size

    # Зеркальное отражение2: Extrude 4 2, Вытянуть-Тонкостенный5 across plane
    add(extrude_4_2.mirror(Plane(origin=(0, 0, 0), x_dir=(0, 0, 1), z_dir=(1, 0, 0))))
    add(extrude_5.mirror(Plane(origin=(0, 0, 0), x_dir=(0, 0, 1), z_dir=(1, 0, 0))))

    # Скругление5 of Зеркальное отражение2
    fillet_5_of_mirror_2_edges = [part.edges().sort_by_distance(p)[0] for p in [
        (-3, -3.5, 7),
        (-2, -3.5, 7),
    ]]
    fillet(fillet_5_of_mirror_2_edges, radius=FILLET_5_OF_MIRROR_2_R - 0.0001)  # a hair under: the kernel refuses the full size


solid = part.part
